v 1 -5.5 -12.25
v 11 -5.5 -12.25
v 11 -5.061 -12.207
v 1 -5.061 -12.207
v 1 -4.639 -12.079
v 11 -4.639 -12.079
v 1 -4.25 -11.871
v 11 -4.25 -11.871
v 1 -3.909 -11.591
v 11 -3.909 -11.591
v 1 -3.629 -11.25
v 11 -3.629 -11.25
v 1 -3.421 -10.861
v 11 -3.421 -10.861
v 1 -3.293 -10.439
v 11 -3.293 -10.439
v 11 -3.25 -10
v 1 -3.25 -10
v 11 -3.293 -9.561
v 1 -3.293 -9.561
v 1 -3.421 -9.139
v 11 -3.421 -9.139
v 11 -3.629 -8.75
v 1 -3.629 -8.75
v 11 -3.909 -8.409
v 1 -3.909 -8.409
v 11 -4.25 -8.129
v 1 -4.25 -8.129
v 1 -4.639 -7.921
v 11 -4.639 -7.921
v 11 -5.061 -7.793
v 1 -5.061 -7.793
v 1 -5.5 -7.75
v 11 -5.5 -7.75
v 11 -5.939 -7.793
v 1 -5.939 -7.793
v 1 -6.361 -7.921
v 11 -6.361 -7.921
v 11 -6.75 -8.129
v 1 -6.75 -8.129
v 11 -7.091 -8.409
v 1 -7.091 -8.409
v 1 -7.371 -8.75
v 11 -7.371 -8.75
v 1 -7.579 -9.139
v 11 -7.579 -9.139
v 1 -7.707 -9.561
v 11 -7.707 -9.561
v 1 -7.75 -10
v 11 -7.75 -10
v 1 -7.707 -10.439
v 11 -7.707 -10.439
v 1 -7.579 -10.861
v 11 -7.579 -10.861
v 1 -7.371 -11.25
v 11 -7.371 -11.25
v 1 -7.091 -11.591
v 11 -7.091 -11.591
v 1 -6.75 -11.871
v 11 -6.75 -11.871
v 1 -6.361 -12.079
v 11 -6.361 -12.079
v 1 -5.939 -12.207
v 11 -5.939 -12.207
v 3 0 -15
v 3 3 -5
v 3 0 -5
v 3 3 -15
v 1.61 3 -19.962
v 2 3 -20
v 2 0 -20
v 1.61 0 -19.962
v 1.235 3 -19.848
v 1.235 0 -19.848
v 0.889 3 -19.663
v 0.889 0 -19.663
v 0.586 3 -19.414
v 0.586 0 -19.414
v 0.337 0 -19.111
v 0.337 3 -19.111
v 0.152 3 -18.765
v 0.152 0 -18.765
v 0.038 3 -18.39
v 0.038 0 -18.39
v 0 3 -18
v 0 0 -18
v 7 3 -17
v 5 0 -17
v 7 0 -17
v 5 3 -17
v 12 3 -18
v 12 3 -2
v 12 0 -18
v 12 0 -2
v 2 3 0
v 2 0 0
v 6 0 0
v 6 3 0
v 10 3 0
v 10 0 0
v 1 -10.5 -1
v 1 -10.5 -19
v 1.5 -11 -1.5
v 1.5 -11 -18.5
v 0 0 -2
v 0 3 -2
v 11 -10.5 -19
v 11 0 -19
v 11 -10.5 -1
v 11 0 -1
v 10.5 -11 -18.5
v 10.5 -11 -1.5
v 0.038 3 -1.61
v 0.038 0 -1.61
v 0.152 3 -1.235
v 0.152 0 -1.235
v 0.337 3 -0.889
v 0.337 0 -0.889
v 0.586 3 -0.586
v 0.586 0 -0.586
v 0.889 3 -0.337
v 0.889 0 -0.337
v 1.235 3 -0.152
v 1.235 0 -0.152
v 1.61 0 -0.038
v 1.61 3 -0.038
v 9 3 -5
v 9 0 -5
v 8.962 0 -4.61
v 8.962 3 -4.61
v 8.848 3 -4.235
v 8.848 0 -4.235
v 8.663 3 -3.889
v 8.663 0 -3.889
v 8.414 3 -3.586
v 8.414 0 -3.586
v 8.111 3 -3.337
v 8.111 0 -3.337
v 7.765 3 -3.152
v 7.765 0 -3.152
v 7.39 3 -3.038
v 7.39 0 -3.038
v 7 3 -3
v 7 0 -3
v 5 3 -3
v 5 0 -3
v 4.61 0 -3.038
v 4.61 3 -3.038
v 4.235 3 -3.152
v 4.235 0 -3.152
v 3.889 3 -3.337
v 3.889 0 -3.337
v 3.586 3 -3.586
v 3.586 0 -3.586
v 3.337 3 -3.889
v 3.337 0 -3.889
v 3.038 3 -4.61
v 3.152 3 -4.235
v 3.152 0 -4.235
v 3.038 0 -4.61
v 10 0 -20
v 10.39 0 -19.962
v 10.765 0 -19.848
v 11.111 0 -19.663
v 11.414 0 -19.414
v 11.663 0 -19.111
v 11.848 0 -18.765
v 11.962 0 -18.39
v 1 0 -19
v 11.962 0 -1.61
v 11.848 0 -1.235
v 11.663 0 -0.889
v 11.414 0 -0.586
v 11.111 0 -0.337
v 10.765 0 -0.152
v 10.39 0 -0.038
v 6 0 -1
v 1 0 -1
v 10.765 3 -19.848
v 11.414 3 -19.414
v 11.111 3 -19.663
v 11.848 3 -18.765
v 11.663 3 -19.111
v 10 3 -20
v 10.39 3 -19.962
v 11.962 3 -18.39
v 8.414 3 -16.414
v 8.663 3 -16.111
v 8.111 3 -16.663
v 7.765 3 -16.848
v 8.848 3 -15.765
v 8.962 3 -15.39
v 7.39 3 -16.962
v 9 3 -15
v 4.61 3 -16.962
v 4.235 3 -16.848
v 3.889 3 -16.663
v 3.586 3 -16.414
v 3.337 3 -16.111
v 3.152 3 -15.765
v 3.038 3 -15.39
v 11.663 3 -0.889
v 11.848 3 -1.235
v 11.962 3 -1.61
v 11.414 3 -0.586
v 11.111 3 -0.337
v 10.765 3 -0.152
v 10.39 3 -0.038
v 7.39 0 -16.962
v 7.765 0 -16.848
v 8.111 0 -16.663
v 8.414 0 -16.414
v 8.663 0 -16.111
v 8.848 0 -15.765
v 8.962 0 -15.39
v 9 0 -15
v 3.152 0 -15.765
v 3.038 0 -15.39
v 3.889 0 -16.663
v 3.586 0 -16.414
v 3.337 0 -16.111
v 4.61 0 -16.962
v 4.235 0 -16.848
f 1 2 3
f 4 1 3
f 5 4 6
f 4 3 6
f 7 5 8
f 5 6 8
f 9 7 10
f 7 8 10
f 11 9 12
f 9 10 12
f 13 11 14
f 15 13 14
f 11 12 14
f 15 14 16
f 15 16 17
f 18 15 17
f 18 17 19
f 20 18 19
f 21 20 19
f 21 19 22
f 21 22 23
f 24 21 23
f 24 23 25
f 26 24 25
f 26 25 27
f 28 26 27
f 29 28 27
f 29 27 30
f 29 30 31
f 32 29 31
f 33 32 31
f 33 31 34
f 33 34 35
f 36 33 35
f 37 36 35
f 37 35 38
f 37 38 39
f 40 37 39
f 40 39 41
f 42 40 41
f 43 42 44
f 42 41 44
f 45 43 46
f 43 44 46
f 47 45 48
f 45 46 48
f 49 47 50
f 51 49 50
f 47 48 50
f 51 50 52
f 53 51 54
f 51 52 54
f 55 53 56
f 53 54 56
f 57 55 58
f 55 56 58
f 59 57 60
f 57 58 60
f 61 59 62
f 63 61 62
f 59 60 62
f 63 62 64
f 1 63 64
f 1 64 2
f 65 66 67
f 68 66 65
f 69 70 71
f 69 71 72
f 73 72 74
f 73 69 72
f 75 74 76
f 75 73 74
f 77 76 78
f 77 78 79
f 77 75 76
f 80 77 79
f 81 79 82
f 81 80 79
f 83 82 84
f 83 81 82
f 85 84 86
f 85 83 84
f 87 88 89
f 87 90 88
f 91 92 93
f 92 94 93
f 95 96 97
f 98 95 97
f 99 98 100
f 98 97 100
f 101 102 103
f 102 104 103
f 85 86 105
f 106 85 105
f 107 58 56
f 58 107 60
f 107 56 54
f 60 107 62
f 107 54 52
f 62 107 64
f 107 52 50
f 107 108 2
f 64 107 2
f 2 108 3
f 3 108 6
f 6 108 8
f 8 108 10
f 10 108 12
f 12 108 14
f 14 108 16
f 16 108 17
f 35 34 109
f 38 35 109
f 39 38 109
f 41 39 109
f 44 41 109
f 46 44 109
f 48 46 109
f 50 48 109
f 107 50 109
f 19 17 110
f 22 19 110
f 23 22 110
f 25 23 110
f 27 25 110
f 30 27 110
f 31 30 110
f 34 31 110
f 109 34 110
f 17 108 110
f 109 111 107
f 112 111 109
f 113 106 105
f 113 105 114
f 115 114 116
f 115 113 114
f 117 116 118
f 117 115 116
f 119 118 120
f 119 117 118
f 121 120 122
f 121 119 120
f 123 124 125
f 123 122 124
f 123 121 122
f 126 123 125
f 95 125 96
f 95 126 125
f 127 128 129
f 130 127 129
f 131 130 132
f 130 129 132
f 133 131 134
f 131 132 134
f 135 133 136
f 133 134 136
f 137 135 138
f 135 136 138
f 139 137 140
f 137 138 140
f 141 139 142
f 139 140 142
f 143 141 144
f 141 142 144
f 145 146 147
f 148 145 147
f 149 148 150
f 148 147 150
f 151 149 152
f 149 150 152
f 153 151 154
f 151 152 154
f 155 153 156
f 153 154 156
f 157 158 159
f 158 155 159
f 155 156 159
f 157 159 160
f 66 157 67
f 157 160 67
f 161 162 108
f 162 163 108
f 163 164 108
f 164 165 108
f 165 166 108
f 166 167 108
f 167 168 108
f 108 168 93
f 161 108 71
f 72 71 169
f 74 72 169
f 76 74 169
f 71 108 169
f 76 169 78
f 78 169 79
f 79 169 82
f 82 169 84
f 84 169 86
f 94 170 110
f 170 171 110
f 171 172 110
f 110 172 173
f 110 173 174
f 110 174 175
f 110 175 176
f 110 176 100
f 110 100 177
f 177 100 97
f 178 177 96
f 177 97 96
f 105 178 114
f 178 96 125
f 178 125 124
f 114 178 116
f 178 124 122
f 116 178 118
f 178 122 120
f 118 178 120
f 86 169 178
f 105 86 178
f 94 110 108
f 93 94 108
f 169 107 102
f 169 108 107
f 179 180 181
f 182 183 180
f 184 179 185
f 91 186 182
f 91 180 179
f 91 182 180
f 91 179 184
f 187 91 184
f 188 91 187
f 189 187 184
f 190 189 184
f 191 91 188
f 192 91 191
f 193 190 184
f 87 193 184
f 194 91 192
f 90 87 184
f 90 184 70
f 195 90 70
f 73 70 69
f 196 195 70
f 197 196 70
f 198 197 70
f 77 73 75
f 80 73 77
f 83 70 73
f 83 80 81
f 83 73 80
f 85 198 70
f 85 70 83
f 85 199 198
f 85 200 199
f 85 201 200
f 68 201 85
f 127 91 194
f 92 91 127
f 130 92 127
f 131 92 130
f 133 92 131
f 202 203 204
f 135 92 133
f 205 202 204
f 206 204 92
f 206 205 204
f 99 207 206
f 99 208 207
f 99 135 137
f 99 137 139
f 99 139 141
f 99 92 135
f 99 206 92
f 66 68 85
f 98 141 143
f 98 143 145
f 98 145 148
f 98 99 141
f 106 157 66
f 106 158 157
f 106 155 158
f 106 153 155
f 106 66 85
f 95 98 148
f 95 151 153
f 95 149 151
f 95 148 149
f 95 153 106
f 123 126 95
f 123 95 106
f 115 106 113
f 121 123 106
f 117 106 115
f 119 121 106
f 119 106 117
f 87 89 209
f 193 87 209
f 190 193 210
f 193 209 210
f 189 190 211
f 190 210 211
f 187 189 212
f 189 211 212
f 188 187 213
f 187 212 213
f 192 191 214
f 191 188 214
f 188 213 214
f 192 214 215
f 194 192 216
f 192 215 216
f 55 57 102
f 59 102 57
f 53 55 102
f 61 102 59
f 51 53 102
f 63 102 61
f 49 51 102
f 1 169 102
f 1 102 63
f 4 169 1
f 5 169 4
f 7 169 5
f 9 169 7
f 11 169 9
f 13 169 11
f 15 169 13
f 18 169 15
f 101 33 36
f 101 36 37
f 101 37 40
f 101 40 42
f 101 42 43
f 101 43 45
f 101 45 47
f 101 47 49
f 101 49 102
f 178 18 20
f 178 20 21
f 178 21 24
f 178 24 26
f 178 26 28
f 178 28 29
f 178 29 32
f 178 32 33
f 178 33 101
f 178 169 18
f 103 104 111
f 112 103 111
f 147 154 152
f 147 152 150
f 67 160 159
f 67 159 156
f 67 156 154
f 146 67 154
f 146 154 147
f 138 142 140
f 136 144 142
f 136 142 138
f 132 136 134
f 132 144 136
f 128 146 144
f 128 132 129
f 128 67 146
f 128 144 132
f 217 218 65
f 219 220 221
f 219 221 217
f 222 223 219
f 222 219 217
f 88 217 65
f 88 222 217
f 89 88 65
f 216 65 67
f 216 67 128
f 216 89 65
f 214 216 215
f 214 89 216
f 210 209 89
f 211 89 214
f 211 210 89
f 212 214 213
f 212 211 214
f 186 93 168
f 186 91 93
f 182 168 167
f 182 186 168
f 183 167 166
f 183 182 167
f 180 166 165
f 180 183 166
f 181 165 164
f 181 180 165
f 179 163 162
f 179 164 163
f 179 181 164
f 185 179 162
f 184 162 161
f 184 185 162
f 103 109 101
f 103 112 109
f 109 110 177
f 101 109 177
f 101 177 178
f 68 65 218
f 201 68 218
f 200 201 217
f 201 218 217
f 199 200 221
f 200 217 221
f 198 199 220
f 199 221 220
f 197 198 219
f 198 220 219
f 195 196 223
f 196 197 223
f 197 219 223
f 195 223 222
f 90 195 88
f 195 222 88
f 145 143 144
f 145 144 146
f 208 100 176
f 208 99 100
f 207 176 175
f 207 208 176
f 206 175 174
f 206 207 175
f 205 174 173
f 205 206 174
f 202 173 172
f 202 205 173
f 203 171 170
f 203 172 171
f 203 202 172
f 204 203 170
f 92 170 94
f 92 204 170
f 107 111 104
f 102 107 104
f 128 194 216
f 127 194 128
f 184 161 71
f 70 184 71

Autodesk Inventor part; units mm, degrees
ref_plane "YZ Plane" through (0, 0, 0) normal (1, 0, 0) x (0, 1, 0)
ref_plane "XZ Plane" through (0, 0, 0) normal (0, 1, 0) x (-1, 0, 0)
ref_plane "XY Plane" through (0, 0, 0) normal (0, 0, 1) x (1, 0, 0)
sketch "Sketch1" plane through (0, 0, 0) normal (0, 1, 0) x (-1, 0, 0)
  line L0 (0, 0) -> (-12, 0)
  line L1 (-12, 0) -> (-12, -20)
  line L2 (-12, -20) -> (0, -20)
  line L3 (0, -20) -> (0, 0)
  line L4 (-6, 0) -> (-6, -1)
  line L5 (-6, -1) -> (-1, -1)
  line L6 (-1, -1) -> (-11, -1)
  line L7 (-11, -1) -> (-11, -19)
  line L8 (-11, -19) -> (-1, -19)
  line L9 (-1, -19) -> (-1, -1)
  dimension "d0" = 12
  dimension "d1" = 20
  dimension "d2" = 1
  dimension "d3" = 5
  dimension "d4" = 10
  dimension "d5" = 18
  dimension "d35" = 0
  dimension "d36" = 1
extrude "Extrusion1" add sketch "Sketch1" along normal blind 3
sketch "Sketch2" plane through (0, 3, 0) normal (0, 1, 0) x (1, 0, 0)
  line L0 (11, 1) -> (1, 1)
  line L1 (11, 19) -> (11, 1)
  line L2 (1, 1) -> (11, 1)
  line L3 (11, 1) -> (11, 19)
  line L4 (11, 19) -> (1, 19)
  line L5 (1, 19) -> (1, 1)
  point P0 (0, 0)
  point P1 (0, 0)
  dimension "d37" = 10
  dimension "d38" = 18
  dimension "d39" = 11
  dimension "d40" = 19
  dimension "d41" = 11
  dimension "d42" = 1
extrude "Extrusion4" add sketch "Sketch2" against normal blind 14
sketch "Sketch5" plane through (11, -11, -1) normal (1, 0, 0) x (0, 0, -1)
  line L0 (0, 11) -> (18, 11) projected
  line L1 (0, 11) -> (0, 0) projected
  line L2 (18, 0) -> (0, 0) projected
  line L3 (18, 11) -> (18, 0) projected
  circle A0 centre (9, 5.5) radius 2.25
  point P0 (-1, 11)
  dimension "d21" = 4.5
  dimension "d43" = 9
  dimension "d44" = 5.5
extrude "Extrusion5" cut sketch "Sketch5" against normal through all contours A0
sketch "Sketch6" plane through (0, 3, 0) normal (0, 1, 0) x (1, 0, 0)
  line L0 (6, 0) -> (6, 3)
  line L1 (6, 3) -> (6, 17)
  line L2 (6, 3) -> (3, 3)
  line L3 (3, 3) -> (3, 17)
  line L4 (3, 17) -> (9, 17)
  line L5 (9, 17) -> (9, 3)
  line L6 (9, 3) -> (6, 3)
  point P0 (0, 0)
  point P1 (0, 0)
  dimension "d24" = 3
  dimension "d25" = 14
  dimension "d26" = 3
  dimension "d27" = 6
  dimension "d28" = 14
  dimension "d29" = 9
  dimension "d30" = 3
  dimension "d31" = 9
  dimension "d32" = 3
extrude "Extrusion6" cut sketch "Sketch6" against normal blind 3
chamfer "Chamfer1" distance 0.5 angle 45 4 edges at (11, -11, -10) (1, -11, -10) (6, -11, -1) (6, -11, -19)
fillet "Fillet1" radius 2 4 edges at (12, 1.5, -20) (12, 1.5, 0) (0, 1.5, -20) (0, 1.5, 0)
fillet "Fillet2" radius 2 4 edges at (3, 1.5, -3) (3, 1.5, -17) (9, 1.5, -3) (9, 1.5, -17)
properties part number "reverse gear steam chest side valve"
